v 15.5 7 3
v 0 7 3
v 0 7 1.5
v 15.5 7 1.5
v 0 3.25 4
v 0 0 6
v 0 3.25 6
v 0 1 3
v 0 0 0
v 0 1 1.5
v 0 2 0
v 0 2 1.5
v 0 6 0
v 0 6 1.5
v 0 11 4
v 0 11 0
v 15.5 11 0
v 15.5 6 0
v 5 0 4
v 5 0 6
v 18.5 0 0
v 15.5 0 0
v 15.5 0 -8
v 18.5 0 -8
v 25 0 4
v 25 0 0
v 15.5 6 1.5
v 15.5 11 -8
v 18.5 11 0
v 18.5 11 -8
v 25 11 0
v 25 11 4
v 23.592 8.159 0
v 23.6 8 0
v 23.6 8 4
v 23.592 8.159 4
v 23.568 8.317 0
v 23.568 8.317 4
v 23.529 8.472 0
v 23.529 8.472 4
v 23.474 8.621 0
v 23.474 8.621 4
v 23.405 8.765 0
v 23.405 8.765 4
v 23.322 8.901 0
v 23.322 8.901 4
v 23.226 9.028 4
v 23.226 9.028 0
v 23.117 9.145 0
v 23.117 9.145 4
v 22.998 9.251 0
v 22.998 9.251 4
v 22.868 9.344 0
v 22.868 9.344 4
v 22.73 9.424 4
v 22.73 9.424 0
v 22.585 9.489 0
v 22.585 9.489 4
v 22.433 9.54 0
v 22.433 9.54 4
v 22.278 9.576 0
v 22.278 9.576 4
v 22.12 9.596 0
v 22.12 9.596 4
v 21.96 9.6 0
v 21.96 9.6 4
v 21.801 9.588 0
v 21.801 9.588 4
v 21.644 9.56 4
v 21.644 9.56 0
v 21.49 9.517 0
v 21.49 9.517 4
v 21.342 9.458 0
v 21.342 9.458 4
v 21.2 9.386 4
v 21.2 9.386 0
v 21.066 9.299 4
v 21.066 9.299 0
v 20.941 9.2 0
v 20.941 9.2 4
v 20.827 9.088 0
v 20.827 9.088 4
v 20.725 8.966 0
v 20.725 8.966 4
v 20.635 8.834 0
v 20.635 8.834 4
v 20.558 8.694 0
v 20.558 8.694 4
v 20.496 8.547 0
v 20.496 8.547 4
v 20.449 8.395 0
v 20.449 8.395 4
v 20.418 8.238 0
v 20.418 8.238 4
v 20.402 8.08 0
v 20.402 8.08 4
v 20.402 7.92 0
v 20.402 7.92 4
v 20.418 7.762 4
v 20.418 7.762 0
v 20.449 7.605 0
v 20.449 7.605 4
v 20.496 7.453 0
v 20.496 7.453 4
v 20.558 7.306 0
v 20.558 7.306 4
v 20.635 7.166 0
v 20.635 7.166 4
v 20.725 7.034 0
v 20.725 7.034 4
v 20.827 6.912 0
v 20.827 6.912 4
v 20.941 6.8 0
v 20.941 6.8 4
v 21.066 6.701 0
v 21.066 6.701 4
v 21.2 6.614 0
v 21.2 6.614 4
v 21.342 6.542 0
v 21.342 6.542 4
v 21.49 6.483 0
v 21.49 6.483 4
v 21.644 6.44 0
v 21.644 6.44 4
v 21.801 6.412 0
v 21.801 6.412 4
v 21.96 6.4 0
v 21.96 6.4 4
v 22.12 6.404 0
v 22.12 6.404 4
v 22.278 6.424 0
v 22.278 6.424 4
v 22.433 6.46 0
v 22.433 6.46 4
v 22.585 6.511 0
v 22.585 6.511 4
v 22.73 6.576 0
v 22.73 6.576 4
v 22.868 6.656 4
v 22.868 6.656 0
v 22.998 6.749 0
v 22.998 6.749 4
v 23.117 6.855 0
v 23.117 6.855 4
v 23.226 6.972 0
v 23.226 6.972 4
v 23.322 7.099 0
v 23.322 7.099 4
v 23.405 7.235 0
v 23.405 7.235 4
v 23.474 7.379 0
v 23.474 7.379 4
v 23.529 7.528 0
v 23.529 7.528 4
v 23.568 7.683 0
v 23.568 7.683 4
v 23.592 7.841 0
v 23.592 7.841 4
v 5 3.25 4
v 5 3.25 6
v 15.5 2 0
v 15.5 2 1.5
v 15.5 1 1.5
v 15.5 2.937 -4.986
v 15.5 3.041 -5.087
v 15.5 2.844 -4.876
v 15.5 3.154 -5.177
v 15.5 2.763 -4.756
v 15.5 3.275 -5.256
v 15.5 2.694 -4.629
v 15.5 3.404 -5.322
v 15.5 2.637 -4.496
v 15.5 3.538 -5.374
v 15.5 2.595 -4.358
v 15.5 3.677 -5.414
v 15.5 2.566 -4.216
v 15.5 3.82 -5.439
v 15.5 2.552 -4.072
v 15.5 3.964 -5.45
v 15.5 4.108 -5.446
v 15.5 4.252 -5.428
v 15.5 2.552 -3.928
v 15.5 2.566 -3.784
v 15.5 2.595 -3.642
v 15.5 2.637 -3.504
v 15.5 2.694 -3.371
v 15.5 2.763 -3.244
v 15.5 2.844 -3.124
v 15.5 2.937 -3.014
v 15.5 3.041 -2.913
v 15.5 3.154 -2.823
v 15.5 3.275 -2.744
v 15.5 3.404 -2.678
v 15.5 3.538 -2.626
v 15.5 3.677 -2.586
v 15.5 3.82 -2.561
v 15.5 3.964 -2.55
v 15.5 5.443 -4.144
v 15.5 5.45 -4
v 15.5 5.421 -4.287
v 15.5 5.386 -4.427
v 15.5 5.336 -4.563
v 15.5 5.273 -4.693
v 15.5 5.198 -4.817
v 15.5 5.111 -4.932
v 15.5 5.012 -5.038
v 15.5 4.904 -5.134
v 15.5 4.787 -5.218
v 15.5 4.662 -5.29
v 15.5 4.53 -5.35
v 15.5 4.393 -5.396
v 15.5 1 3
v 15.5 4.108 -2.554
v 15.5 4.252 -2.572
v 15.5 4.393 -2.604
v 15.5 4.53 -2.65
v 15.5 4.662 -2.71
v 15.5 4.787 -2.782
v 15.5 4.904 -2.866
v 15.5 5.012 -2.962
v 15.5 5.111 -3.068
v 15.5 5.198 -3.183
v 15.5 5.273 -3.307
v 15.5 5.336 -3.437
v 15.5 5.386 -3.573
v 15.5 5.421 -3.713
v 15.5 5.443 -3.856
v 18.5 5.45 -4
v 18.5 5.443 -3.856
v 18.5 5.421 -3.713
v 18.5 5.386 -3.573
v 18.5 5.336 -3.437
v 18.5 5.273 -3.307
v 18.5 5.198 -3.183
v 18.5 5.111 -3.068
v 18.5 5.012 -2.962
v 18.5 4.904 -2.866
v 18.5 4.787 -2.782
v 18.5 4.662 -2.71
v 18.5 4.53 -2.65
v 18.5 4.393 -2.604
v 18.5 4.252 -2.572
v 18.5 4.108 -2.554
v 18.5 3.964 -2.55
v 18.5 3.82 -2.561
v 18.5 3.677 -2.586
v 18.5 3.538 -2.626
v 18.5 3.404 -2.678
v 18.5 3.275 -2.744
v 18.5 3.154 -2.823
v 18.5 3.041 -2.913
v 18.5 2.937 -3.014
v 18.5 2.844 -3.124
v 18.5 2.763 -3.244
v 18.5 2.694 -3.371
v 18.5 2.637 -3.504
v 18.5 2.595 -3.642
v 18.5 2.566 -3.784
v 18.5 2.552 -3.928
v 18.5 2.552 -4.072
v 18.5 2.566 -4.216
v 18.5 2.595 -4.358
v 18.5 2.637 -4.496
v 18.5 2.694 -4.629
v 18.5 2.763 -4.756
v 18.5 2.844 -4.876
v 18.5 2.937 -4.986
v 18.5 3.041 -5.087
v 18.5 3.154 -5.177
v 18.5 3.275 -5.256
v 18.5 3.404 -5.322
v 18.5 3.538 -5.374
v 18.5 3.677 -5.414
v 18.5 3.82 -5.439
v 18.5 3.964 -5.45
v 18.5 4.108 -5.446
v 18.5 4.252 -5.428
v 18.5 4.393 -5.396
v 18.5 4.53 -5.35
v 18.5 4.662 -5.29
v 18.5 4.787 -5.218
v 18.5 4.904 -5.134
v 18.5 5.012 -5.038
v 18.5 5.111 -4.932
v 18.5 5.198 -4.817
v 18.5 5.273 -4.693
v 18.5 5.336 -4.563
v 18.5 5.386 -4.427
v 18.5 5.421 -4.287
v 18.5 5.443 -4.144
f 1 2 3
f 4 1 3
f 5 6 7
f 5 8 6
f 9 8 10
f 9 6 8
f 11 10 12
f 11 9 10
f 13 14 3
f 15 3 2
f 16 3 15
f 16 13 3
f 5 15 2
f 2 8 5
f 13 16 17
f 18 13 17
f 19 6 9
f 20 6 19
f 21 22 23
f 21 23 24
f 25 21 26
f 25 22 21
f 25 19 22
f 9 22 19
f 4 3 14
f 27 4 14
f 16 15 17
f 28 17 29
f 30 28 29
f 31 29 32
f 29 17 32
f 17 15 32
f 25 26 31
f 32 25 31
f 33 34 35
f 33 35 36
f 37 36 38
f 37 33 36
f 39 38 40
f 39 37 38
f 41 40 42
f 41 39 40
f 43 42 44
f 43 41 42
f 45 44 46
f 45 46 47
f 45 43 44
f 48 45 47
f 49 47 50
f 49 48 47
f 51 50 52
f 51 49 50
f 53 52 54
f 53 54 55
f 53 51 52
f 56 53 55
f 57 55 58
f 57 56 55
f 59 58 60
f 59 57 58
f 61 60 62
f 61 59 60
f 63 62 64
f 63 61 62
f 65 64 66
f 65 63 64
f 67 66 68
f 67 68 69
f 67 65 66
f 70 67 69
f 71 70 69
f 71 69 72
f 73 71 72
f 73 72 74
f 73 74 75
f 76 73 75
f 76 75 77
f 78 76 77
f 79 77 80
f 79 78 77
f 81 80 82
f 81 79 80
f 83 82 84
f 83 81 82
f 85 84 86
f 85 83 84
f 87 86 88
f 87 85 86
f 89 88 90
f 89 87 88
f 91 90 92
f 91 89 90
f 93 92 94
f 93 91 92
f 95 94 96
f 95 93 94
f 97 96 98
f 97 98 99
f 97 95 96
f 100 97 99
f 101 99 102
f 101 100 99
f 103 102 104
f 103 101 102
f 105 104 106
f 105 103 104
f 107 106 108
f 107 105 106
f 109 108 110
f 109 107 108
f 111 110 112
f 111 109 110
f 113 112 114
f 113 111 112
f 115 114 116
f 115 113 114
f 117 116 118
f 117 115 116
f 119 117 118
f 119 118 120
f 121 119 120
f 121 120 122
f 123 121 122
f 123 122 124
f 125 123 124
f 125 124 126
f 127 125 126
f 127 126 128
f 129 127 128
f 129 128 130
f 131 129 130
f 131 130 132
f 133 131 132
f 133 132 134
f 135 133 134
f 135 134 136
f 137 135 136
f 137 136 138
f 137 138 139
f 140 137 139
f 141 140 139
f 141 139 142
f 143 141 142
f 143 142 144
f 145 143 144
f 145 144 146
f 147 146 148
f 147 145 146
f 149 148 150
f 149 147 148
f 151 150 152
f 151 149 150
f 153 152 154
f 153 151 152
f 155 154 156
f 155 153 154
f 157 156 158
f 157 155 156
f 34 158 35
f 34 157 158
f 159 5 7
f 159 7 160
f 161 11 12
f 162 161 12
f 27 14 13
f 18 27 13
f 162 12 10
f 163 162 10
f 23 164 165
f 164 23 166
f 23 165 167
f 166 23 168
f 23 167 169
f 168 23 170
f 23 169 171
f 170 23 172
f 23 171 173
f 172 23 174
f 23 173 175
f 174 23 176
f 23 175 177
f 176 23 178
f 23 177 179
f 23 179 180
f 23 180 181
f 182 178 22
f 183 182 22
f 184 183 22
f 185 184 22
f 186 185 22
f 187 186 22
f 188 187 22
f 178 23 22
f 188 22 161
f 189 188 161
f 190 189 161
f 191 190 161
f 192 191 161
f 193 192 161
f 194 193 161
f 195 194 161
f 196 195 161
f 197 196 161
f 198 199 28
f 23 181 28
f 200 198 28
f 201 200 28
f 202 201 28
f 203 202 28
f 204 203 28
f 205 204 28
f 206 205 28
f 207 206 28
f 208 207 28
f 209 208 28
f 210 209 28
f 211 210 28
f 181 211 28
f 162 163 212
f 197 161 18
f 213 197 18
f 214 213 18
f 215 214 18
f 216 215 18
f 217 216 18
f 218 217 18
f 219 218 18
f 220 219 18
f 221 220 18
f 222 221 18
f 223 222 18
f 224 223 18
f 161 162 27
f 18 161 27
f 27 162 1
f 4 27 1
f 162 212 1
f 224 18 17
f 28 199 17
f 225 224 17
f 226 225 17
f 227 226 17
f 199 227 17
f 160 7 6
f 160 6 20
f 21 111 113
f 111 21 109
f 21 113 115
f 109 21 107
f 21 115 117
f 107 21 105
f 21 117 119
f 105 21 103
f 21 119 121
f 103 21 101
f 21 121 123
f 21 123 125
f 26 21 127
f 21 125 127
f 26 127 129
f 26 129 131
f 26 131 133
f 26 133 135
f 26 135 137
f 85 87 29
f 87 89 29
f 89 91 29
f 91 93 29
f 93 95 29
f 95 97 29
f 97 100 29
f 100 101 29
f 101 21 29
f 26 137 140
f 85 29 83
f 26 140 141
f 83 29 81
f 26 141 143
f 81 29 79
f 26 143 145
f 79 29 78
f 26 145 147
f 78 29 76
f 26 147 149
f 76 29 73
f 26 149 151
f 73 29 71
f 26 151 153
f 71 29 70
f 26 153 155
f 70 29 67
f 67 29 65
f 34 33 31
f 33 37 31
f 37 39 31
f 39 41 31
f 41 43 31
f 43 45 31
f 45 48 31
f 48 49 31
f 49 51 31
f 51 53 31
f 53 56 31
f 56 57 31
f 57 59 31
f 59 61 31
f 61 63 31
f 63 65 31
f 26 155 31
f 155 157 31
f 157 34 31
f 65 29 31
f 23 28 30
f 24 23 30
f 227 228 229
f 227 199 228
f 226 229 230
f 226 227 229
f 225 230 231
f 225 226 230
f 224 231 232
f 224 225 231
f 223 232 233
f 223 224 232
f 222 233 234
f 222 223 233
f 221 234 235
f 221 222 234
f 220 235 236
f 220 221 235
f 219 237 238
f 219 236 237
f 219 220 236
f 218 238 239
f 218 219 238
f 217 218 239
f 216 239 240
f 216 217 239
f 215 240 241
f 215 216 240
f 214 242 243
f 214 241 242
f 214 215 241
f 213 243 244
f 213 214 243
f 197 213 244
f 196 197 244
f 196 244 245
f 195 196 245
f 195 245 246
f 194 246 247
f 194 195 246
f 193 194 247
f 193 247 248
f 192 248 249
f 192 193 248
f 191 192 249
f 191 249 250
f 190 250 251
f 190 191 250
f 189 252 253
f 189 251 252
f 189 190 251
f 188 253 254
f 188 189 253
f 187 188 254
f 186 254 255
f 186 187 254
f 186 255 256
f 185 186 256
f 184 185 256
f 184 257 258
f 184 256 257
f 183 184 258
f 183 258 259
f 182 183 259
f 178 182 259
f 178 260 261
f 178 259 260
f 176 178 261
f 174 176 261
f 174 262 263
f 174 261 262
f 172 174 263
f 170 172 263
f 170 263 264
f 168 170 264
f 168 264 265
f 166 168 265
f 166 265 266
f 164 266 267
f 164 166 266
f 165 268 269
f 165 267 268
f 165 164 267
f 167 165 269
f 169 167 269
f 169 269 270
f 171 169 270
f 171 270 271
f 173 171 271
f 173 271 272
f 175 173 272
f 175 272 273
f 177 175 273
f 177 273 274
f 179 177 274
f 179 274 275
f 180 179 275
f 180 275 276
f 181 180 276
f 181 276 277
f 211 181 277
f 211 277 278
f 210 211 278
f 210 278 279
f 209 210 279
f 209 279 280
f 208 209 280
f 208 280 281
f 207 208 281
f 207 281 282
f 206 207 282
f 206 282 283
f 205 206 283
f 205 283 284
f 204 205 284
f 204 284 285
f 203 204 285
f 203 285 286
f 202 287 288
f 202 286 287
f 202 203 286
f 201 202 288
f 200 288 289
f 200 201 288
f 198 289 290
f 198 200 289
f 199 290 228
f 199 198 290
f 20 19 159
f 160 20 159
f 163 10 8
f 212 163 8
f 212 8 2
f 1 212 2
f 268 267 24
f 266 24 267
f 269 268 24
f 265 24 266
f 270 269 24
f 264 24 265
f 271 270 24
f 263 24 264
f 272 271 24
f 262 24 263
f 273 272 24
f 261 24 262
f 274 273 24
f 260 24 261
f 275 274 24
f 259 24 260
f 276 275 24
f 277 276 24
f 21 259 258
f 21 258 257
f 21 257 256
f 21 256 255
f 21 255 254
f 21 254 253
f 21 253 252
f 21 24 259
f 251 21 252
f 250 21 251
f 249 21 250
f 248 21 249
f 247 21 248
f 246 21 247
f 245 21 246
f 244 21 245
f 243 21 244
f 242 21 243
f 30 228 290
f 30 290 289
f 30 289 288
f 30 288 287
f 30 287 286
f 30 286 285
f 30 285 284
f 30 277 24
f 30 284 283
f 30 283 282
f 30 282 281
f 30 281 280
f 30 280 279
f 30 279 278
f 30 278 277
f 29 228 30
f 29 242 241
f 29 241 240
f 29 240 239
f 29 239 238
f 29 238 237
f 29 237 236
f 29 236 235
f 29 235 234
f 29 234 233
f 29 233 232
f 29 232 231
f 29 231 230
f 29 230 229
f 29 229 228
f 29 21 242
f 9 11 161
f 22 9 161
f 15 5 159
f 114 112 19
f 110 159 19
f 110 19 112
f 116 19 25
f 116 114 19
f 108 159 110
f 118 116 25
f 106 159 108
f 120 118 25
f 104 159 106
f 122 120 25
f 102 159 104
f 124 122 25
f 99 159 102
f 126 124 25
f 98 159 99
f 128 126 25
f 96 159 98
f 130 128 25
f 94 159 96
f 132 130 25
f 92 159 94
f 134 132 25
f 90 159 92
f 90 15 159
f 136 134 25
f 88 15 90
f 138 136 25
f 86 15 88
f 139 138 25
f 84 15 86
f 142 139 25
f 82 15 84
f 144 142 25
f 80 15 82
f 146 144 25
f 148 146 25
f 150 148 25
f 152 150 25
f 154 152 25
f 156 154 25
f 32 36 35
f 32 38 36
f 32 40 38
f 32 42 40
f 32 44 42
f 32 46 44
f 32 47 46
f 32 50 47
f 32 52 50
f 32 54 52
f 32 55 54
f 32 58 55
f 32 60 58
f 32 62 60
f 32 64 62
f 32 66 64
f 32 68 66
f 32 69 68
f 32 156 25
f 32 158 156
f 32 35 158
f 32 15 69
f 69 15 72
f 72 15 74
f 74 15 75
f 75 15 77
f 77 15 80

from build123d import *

# Parameters (mm, degrees)
SKETCH_W          = 25
SKETCH_H          = 11
SKETCH_R          = 1.6
PAD_DEPTH         = 4
POCKET_DEPTH      = 18
SKETCH002_W       = 5
SKETCH002_H       = 3.25
PAD001_DEPTH      = 2
SKETCH003_W       = 3
SKETCH003_H       = 11
PAD002_DEPTH      = 4
PAD002_DEPTH_BACK = 8
SKETCH004_R       = 1.45
POCKET001_DEPTH   = 25.001


with BuildPart() as part:
    # Sketch → Pad (new body)
    with BuildSketch(Plane.XY):
        with Locations((12.5, 5.5)):
            Rectangle(SKETCH_W, SKETCH_H)
        with Locations((22, 8)):
            Circle(SKETCH_R, mode=Mode.SUBTRACT)
    extrude(amount=PAD_DEPTH)

    # Sketch001 → Pocket (cut)
    with BuildSketch(Plane.YZ):
        Polygon((1, 3), (7, 3), (7, 1.5), (6, 1.5), (6, 0), (2, 0), (2, 1.5), (1, 1.5), align=None)
    extrude(amount=POCKET_DEPTH, mode=Mode.SUBTRACT)

    # Sketch002 (on DatumPlane) → Pad001 (join)
    with BuildSketch(Plane.XY.offset(4)):
        with Locations((2.5, 1.625)):
            Rectangle(SKETCH002_W, SKETCH002_H)
    extrude(amount=PAD001_DEPTH)

    # Sketch003 → Pad002 (join, two sides)
    with BuildSketch(Plane.XY) as pad002_sk:
        with Locations((17, 5.5)):
            Rectangle(SKETCH003_W, SKETCH003_H)
    extrude(amount=PAD002_DEPTH)
    extrude(pad002_sk.sketch, amount=-PAD002_DEPTH_BACK)

    # Sketch004 → Pocket001 (cut, through all)
    with BuildSketch(Plane.YZ):
        with Locations((4, -4)):
            Circle(SKETCH004_R)
    extrude(amount=POCKET001_DEPTH, mode=Mode.SUBTRACT)


solid = part.part
